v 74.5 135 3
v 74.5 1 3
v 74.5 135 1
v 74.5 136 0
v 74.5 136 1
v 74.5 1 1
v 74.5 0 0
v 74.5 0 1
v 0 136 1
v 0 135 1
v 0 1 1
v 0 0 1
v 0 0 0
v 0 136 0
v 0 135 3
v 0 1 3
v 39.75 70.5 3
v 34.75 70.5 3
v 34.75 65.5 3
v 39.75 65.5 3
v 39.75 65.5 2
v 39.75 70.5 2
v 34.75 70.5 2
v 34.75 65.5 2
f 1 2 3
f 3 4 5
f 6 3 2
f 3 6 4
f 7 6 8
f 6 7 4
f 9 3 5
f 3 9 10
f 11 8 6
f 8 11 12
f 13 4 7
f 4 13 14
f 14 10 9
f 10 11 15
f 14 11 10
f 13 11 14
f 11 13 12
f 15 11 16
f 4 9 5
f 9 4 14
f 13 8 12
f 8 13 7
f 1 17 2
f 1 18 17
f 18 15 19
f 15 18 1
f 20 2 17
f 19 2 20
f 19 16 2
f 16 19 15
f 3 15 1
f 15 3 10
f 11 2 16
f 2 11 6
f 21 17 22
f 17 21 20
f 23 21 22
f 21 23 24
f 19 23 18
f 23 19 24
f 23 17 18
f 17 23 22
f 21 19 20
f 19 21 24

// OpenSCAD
DIM = [
	76.5, // Spielerinnenablage richtung
	138, // Links-Rechts
	29
];



difference(){

	union(){
		cube([ DIM.x-2 , DIM.y-2 , 1 ]);
		translate([ 0 , 1 , 1 ]) cube([ DIM.x-2 , DIM.y-4 , 2 ]);
	}
	
	// Symbol
	translate([ 0.5*(DIM.x-2) , 0.5*(DIM.y-2) , 2 ]) Symbol();
}

module Symbol () {
	
	Z = 2;
	translate([0,0,0.5*Z]) cube([5,5,Z],center=true);
	
}
